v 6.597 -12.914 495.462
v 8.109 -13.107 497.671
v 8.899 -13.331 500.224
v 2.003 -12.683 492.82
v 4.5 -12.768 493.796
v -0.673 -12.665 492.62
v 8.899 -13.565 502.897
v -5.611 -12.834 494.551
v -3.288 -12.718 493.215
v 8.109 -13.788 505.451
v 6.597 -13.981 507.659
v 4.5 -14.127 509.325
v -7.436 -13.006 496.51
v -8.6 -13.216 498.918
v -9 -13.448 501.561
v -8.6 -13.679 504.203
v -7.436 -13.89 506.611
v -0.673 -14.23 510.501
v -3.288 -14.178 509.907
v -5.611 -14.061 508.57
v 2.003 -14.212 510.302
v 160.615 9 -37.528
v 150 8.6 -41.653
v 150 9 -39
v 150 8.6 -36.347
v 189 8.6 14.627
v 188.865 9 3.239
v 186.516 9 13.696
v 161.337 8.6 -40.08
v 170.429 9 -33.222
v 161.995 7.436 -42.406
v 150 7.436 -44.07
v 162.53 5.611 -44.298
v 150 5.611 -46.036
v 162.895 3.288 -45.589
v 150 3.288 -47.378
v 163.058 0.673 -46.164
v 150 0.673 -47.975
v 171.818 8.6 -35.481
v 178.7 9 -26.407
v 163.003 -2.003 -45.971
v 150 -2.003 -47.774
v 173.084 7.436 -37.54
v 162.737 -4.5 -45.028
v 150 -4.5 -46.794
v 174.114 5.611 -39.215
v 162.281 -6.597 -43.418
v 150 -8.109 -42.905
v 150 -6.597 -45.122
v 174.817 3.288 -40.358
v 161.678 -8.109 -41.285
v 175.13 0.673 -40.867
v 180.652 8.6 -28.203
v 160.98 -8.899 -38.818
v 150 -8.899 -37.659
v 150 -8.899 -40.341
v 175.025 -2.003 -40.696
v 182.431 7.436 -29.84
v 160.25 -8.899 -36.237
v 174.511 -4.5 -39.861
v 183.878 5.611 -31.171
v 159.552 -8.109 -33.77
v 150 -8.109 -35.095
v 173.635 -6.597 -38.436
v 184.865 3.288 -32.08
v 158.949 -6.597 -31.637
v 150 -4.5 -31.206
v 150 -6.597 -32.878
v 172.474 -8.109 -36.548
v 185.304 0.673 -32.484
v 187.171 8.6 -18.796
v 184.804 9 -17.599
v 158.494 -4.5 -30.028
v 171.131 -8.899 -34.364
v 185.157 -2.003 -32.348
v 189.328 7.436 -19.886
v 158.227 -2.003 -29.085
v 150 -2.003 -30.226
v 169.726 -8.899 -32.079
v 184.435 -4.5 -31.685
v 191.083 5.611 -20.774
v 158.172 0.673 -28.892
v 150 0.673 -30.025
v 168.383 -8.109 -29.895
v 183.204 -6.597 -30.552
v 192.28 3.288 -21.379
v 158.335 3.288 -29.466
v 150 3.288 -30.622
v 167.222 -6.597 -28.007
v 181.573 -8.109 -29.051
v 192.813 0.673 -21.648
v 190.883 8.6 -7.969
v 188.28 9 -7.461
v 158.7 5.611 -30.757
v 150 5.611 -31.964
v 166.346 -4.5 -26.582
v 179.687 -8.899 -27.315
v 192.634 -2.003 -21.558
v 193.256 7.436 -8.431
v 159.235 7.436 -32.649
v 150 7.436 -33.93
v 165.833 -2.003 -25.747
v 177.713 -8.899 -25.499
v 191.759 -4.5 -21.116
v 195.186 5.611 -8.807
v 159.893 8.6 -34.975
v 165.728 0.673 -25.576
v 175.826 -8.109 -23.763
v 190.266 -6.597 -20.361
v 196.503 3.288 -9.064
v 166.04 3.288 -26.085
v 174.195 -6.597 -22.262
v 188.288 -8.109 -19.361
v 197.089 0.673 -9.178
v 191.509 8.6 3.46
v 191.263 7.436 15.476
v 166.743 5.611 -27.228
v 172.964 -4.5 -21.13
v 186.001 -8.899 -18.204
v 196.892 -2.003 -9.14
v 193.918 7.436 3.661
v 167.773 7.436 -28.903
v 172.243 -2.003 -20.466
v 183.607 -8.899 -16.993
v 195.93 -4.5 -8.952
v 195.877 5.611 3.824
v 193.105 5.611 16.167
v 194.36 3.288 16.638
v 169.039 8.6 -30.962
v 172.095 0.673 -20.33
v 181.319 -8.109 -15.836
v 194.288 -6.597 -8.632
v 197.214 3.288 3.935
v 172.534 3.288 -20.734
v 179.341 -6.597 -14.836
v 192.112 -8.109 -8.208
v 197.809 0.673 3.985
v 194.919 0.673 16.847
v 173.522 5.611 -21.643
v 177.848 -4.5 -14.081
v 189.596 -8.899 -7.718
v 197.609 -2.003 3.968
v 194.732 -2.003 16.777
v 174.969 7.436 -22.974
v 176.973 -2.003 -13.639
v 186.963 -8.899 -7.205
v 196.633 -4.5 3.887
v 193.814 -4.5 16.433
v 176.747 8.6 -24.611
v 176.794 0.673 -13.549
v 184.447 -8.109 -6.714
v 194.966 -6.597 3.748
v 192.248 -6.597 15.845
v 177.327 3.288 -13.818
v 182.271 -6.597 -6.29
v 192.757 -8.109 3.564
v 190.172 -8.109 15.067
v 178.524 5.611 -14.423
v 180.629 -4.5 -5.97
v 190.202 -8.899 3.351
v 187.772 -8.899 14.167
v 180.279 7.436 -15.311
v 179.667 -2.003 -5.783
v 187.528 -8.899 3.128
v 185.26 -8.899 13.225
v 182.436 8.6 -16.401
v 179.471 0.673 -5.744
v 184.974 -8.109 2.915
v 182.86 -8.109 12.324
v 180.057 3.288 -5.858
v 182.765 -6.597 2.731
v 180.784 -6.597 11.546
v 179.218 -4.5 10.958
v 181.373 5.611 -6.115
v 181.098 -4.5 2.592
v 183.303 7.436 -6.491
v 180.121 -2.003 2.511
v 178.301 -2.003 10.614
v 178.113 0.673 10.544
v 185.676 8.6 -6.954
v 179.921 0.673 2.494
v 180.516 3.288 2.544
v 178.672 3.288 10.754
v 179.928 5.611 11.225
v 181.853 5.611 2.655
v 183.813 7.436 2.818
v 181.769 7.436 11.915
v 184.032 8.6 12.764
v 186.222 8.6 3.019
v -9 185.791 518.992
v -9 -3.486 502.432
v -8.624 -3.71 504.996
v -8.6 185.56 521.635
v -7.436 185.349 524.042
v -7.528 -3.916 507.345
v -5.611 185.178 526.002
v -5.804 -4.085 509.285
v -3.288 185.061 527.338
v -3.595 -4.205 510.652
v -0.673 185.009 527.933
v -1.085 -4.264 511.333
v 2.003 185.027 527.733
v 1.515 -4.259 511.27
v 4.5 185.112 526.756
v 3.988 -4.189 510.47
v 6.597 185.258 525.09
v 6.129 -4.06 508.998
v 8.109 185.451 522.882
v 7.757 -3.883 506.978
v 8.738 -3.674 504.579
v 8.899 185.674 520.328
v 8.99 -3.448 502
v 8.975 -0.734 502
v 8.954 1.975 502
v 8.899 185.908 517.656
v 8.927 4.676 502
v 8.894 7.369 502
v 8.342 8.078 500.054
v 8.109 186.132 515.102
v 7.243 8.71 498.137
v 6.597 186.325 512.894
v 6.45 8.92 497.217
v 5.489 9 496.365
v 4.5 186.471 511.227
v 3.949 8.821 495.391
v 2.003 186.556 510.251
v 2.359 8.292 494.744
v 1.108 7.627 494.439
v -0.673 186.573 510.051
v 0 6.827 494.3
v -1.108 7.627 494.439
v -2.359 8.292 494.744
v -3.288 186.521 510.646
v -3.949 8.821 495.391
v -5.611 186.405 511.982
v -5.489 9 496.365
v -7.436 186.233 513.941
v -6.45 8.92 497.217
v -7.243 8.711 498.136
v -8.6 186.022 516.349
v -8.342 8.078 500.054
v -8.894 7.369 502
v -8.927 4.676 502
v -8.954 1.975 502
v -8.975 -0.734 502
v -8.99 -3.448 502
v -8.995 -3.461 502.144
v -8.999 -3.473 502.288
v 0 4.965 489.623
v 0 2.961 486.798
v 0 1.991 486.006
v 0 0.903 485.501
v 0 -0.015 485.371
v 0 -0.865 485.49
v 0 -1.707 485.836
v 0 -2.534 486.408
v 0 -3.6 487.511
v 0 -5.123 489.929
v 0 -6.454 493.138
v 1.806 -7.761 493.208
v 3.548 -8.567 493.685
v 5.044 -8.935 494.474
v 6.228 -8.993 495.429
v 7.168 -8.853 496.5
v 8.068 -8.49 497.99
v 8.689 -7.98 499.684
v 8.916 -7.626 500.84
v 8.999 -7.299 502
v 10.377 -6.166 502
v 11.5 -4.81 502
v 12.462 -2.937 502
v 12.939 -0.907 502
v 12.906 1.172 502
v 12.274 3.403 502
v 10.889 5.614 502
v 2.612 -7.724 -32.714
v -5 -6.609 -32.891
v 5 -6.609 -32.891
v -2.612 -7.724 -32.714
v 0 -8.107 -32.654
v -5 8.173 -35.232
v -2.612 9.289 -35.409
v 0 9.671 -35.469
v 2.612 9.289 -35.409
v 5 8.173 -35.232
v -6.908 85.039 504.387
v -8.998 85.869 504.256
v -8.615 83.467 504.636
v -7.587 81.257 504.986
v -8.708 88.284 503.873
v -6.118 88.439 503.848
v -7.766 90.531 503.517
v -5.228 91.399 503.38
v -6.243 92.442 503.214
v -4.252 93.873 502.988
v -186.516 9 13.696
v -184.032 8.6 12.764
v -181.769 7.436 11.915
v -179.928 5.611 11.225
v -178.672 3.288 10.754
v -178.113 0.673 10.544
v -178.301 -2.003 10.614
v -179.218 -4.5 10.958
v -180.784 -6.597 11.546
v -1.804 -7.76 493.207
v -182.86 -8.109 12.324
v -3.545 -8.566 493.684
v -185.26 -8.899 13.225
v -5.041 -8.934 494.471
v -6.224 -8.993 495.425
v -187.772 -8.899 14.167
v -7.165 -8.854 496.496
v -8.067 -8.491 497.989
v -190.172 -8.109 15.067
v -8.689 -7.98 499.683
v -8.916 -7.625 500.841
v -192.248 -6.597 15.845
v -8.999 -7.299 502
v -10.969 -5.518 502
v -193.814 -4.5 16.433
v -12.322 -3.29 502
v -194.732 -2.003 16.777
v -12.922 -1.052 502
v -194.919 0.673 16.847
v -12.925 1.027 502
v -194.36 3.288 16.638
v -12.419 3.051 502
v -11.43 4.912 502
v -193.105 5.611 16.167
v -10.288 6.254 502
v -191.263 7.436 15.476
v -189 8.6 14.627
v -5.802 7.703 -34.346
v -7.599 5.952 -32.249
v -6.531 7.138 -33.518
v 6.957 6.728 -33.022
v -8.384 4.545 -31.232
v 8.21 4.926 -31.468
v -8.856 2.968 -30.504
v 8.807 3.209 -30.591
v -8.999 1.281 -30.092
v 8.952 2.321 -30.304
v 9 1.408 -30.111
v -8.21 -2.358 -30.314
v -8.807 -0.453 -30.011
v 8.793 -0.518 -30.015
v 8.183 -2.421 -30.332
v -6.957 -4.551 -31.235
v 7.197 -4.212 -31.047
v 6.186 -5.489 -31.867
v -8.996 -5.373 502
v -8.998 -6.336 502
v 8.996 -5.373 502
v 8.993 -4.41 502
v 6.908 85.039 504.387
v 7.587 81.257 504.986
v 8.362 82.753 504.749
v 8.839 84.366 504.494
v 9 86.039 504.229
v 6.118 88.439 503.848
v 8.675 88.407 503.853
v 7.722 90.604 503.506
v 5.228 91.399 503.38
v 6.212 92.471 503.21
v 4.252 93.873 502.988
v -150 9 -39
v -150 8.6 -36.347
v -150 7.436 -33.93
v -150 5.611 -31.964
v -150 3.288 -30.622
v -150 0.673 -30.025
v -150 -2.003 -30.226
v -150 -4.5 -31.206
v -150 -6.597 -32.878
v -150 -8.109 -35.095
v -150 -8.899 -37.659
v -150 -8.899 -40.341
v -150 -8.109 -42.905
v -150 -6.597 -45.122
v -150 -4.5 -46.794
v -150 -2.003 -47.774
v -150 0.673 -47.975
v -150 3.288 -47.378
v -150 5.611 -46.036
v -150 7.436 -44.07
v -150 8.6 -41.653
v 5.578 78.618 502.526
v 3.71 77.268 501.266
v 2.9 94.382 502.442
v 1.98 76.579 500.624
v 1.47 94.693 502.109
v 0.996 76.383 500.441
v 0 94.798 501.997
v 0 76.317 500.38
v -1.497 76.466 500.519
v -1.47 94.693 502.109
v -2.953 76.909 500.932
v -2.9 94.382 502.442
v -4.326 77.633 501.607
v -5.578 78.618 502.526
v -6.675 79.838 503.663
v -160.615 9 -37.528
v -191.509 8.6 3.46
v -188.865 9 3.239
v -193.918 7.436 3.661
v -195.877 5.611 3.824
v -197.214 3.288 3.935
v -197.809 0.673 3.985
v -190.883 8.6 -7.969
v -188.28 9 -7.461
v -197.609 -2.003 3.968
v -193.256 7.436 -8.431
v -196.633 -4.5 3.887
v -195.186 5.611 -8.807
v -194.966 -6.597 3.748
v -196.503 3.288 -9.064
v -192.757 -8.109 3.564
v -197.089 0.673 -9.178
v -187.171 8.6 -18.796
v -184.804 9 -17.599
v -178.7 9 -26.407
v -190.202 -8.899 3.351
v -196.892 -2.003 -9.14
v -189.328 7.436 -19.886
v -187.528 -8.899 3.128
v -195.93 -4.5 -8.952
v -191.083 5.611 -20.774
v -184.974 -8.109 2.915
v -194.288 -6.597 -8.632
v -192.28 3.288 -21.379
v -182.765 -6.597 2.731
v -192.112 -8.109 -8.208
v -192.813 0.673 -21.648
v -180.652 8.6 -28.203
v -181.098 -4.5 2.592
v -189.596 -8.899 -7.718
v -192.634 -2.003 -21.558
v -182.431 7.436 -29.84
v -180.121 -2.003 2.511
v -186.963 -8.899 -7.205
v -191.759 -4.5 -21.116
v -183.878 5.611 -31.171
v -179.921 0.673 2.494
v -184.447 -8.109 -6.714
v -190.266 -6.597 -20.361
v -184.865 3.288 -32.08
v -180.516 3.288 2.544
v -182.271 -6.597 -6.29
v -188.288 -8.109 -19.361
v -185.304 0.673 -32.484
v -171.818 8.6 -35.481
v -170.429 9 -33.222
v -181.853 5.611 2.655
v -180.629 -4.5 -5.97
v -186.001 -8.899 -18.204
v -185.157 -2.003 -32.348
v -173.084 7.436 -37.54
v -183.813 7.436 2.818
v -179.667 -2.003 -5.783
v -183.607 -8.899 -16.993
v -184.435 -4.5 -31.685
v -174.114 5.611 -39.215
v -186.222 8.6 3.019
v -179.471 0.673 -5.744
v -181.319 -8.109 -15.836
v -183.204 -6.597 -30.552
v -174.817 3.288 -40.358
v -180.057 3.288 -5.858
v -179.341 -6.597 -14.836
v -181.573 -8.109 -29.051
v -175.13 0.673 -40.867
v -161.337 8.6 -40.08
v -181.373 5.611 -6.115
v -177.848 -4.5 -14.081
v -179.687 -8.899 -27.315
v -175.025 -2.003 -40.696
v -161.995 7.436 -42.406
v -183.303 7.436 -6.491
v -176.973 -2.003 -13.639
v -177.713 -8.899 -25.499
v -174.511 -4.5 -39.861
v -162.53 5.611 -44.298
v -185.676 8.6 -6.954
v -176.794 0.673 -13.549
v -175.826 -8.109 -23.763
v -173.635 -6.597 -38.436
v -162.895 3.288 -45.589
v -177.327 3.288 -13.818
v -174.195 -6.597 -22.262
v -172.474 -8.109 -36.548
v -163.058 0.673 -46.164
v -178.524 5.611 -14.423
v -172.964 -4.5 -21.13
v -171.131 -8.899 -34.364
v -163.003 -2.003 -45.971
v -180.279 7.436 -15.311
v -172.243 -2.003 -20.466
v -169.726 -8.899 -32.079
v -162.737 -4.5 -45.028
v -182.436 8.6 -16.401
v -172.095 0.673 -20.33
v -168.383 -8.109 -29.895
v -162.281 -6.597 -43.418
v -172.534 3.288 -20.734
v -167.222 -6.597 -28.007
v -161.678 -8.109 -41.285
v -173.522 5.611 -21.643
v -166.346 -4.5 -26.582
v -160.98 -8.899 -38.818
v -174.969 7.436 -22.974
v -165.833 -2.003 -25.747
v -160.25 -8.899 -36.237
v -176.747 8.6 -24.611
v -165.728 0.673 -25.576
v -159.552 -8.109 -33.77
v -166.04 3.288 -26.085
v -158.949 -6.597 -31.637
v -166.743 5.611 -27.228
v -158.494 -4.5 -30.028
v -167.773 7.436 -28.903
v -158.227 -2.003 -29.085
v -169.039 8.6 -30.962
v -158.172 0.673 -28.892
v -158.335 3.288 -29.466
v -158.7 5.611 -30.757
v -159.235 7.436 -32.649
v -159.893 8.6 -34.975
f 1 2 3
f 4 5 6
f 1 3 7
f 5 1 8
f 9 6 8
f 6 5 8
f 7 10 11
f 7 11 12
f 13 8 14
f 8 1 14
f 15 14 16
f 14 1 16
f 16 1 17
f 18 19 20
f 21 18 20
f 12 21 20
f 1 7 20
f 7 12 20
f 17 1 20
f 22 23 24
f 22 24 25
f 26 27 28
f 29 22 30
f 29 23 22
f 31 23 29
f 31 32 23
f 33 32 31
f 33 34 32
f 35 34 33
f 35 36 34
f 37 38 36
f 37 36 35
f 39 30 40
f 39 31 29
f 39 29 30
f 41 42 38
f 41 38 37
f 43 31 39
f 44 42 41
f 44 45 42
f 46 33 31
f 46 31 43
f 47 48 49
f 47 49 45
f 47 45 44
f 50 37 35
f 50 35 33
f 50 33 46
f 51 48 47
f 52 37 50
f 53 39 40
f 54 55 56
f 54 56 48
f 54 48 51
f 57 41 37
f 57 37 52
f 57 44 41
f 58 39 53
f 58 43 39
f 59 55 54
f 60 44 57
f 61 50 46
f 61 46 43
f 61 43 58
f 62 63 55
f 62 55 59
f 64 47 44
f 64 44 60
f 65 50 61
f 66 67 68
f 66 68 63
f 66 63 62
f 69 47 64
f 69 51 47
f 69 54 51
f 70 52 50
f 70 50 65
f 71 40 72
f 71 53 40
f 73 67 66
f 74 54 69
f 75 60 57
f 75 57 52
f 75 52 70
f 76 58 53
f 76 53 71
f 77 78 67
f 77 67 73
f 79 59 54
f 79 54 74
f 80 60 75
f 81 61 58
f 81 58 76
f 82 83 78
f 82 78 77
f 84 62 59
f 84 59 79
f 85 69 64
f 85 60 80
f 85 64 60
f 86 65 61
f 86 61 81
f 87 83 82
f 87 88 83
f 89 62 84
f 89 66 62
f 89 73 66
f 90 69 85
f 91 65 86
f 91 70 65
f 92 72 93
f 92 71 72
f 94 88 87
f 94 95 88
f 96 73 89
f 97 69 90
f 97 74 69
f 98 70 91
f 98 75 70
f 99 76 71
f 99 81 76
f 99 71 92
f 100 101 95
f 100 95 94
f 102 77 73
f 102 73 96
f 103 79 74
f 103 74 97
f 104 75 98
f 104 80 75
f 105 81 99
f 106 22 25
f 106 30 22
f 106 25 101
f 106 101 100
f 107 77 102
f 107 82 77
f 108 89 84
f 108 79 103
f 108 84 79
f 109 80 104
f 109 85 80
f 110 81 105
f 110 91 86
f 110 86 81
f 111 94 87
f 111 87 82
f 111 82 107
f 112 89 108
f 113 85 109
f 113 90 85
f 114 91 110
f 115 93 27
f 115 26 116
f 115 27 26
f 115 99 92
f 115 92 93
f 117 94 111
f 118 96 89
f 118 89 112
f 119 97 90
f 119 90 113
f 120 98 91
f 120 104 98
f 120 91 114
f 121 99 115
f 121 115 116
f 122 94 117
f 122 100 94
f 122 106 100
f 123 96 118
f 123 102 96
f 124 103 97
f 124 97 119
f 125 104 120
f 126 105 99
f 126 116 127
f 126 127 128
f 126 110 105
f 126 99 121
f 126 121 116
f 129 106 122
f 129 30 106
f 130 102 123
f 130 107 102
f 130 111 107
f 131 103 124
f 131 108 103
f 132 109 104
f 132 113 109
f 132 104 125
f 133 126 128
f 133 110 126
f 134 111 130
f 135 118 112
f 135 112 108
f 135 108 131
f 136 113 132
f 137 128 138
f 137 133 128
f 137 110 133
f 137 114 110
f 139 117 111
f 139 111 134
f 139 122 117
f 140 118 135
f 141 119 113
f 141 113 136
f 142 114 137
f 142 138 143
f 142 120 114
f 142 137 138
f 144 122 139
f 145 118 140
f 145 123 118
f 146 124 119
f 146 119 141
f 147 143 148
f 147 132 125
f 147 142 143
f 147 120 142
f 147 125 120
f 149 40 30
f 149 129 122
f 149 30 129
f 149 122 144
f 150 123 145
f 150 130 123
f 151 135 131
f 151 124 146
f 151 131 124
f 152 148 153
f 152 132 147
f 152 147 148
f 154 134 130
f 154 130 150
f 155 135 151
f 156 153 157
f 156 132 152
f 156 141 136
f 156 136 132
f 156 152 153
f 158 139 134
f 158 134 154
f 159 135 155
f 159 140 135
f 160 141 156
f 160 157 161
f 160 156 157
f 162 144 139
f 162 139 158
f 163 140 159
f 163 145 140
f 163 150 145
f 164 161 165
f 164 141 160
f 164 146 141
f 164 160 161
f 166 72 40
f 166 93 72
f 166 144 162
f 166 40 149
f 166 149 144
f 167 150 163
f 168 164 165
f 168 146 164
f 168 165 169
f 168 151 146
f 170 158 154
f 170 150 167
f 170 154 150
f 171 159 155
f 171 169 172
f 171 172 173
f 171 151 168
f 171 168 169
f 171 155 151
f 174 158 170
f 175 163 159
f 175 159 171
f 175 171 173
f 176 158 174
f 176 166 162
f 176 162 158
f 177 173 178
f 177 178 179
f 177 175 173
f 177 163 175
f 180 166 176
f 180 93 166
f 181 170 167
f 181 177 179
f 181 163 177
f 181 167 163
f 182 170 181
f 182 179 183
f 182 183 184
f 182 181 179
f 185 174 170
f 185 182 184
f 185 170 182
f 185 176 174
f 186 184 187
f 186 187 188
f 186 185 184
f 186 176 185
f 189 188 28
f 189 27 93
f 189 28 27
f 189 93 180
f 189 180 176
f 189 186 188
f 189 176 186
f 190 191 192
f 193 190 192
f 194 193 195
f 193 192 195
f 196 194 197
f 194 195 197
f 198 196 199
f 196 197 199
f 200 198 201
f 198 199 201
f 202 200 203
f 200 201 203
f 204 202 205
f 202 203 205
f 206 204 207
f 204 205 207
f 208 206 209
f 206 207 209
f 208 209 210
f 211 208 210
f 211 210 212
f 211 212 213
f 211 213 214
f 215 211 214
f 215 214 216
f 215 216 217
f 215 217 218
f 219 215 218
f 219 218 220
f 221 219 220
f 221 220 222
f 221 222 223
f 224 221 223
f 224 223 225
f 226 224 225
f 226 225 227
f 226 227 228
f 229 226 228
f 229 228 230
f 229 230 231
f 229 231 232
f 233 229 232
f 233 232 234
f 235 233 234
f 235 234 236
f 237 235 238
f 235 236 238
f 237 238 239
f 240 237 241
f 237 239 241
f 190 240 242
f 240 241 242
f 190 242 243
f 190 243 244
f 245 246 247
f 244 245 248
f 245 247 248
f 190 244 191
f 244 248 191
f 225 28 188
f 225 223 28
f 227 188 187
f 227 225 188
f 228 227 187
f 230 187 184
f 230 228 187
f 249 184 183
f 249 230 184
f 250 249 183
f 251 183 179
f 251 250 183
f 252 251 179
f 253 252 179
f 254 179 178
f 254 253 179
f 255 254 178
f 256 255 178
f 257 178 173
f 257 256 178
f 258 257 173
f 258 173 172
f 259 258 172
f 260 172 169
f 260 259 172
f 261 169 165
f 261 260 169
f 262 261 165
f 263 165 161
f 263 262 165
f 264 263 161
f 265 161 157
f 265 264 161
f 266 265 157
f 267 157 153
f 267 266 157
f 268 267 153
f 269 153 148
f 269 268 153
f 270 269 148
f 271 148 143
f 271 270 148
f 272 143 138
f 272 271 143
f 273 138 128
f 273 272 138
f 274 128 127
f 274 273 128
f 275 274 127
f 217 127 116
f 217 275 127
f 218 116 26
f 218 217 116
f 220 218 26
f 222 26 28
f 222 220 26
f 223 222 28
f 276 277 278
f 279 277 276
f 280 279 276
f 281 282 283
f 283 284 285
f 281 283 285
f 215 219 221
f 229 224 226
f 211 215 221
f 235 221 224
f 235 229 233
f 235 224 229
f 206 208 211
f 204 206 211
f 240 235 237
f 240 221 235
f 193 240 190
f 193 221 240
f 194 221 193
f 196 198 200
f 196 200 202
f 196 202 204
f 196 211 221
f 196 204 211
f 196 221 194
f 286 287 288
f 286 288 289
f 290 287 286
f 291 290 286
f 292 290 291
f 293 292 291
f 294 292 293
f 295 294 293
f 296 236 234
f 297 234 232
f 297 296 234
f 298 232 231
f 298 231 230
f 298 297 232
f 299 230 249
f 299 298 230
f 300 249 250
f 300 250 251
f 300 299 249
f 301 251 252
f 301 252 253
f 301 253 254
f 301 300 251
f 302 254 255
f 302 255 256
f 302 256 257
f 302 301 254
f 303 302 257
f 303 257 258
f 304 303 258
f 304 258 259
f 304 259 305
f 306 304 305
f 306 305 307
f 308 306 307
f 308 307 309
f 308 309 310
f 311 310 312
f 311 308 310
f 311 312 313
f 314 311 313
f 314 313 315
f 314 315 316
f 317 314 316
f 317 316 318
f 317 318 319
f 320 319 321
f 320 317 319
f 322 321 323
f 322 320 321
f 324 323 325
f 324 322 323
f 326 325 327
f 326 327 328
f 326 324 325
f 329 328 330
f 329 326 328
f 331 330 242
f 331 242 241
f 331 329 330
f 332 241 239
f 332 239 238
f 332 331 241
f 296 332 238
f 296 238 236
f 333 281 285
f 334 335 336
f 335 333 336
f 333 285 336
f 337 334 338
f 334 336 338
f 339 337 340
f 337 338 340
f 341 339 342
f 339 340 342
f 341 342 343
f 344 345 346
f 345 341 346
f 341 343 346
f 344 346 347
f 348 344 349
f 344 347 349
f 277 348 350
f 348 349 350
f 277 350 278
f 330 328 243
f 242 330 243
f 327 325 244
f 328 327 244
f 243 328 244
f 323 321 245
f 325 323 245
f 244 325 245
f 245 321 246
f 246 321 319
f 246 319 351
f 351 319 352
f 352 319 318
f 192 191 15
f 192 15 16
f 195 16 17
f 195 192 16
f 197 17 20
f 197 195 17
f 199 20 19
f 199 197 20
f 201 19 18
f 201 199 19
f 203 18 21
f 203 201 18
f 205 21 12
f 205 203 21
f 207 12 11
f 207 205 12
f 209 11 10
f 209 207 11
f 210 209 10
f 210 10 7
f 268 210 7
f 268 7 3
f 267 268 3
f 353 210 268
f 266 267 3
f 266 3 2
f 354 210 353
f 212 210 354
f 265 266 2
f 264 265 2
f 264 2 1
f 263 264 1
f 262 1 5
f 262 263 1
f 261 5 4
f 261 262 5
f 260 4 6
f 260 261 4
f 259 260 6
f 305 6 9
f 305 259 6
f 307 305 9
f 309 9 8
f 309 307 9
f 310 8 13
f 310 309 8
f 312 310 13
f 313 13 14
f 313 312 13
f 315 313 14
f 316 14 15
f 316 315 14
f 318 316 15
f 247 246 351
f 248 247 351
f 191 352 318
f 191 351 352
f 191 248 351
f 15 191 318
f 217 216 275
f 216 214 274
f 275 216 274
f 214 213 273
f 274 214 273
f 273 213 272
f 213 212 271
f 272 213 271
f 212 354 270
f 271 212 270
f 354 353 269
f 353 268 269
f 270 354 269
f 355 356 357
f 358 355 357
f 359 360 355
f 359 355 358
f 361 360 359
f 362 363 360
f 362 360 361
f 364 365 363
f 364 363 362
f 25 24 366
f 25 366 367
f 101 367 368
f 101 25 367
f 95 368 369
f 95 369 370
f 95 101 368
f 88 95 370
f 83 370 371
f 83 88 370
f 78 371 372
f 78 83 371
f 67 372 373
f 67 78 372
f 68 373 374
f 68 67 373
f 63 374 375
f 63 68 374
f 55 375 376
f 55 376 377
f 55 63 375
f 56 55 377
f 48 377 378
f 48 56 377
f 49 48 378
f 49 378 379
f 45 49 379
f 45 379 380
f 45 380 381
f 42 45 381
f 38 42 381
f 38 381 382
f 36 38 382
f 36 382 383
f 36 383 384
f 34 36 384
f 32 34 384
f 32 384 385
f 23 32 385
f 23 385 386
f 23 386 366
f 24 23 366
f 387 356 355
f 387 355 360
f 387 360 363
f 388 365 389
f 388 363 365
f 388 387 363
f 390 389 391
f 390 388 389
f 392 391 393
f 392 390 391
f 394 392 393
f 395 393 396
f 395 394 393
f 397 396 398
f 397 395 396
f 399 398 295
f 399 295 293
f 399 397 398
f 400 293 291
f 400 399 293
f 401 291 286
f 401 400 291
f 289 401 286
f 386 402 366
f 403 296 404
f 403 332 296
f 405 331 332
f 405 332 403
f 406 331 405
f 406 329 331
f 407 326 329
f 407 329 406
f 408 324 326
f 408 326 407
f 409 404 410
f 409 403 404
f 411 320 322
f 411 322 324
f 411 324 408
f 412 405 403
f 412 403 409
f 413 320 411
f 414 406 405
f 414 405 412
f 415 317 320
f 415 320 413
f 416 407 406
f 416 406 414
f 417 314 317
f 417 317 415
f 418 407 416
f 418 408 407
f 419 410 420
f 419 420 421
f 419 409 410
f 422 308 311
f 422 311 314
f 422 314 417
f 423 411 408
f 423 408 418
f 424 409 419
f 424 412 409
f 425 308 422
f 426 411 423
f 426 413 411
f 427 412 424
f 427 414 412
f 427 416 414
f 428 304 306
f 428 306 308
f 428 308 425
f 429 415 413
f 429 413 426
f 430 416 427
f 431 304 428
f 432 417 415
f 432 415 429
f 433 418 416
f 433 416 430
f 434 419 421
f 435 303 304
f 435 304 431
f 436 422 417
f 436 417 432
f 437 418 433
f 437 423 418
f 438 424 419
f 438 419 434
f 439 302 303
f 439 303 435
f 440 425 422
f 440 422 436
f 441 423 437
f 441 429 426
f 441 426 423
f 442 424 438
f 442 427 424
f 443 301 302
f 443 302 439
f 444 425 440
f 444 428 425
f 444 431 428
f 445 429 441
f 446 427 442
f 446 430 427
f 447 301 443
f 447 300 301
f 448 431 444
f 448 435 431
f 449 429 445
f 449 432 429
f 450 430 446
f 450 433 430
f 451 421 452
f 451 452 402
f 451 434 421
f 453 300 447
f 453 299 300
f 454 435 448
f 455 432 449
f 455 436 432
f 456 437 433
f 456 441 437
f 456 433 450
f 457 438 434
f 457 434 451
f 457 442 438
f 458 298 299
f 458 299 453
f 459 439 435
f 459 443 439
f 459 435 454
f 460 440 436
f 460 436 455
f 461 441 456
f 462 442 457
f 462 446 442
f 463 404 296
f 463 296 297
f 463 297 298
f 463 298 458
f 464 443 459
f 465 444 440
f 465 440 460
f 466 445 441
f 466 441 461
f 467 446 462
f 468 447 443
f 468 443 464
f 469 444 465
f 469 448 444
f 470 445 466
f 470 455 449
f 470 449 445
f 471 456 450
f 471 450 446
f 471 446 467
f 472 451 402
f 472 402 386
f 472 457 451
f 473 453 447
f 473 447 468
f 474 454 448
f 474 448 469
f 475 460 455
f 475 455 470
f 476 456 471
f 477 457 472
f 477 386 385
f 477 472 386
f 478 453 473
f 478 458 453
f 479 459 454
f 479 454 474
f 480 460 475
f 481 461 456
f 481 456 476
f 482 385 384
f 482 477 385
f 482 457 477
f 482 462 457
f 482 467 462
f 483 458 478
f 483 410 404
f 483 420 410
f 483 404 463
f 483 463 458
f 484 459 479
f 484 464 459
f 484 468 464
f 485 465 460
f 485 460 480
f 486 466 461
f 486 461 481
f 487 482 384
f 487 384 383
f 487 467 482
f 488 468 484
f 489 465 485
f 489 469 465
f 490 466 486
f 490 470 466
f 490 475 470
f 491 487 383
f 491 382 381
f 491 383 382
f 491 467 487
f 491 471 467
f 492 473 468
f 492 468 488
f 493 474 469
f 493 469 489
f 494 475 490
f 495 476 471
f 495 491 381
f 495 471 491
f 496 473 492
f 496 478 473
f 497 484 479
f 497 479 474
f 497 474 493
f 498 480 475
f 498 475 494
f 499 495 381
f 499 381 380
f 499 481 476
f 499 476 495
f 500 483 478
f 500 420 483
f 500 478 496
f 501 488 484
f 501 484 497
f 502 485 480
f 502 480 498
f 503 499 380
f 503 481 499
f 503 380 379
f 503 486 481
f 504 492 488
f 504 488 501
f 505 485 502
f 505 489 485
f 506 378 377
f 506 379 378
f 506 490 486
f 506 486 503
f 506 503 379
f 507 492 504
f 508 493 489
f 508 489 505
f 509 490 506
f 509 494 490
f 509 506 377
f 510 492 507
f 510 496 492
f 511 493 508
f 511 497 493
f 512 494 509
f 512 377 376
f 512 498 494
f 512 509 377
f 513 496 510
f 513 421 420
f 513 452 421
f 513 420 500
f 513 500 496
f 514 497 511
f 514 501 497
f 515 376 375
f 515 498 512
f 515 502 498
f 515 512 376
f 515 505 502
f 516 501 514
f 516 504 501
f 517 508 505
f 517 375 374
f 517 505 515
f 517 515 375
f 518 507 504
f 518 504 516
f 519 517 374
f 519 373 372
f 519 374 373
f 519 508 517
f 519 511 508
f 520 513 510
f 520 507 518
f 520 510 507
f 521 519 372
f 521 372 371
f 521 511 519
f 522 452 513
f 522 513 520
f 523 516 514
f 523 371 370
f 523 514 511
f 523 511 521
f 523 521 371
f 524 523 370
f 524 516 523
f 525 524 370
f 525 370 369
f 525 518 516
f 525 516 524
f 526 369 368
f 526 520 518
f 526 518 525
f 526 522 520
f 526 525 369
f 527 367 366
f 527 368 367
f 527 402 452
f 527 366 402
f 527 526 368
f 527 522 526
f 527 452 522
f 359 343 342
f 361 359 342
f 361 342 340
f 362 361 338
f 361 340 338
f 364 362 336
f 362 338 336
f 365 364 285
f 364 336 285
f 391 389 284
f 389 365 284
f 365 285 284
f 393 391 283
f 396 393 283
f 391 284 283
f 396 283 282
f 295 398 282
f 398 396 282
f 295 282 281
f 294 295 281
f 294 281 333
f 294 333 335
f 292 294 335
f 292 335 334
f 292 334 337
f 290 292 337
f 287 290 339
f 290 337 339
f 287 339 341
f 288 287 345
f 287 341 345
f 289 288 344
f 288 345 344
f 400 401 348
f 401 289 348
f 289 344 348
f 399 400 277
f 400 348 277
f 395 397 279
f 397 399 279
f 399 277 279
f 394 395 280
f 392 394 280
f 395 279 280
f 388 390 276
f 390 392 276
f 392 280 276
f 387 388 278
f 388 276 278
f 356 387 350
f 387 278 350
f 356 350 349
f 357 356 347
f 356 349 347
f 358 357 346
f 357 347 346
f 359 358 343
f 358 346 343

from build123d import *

# Parameters (mm, degrees)
F3_R           = 9
F7_W           = 211.4251245066
F7_H           = 70.145696709
F8_DEPTH       = 12.5
F9_R           = 9
F10_DEPTH      = 190
F10_DEPTH_BACK = 10
F16_START      = 5
F15_R          = 9
F16_DEPTH      = 545


with BuildPart() as f4:
    # F4: sweep along a path in F1
    with BuildLine(Plane.XZ) as f4_path:
        Line((-150, -39), (150, -39))
        ThreePointArc((150, -39), (182.0556281104, -22.2134352689), (186.5161856429, 13.6955535155))
        Line((186.5161856429, 13.6955535155), (0, 511))
        Line((0, 511), (-186.5161856429, 13.6955535155))
        ThreePointArc((-186.5161856429, 13.6955535155), (-182.0556281104, -22.2134352689), (-150, -39))
    # F3 (on line) → F4 (sweep)
    with BuildSketch(Plane.YZ.offset(150)):
        with Locations((0, -39)):
            Circle(F3_R)
    sweep(path=f4_path.line, transition=Transition.RIGHT)

    # F7 (on Front) → F8 (cut, symmetric)
    with BuildSketch(Plane.XZ):
        with Locations((16.5445394814, 537.0728483545)):
            Rectangle(F7_W, F7_H)
    extrude(amount=F8_DEPTH, both=True, mode=Mode.SUBTRACT)

    # F9 (on face) → F10 (join, two sides)
    with BuildSketch(Plane(origin=(0, 40.1639663204, 3.5138917353), x_dir=(-1, 0, 0), z_dir=(0, 0.9961946981, 0.0871557427))) as f10_sk:
        with Locations((0, 500.8241835071)):
            Circle(F9_R)
    extrude(amount=F10_DEPTH)
    extrude(f10_sk.sketch, amount=-F10_DEPTH_BACK)


with BuildPart() as f16:
    # F15 (on line) → F16 (new body)
    with BuildSketch(Plane(origin=(0, -6.0258313903, -38.0456020678), x_dir=(1, 0, 0), z_dir=(0, 0.156434465, 0.9876883406)).offset(F16_START)):
        with Locations((0, 6.1009441366)):
            Circle(F15_R)
    extrude(amount=F16_DEPTH)

    # F17: cut F4
    add(f4.part, mode=Mode.SUBTRACT)


solid = Compound([f4.part, f16.part])
